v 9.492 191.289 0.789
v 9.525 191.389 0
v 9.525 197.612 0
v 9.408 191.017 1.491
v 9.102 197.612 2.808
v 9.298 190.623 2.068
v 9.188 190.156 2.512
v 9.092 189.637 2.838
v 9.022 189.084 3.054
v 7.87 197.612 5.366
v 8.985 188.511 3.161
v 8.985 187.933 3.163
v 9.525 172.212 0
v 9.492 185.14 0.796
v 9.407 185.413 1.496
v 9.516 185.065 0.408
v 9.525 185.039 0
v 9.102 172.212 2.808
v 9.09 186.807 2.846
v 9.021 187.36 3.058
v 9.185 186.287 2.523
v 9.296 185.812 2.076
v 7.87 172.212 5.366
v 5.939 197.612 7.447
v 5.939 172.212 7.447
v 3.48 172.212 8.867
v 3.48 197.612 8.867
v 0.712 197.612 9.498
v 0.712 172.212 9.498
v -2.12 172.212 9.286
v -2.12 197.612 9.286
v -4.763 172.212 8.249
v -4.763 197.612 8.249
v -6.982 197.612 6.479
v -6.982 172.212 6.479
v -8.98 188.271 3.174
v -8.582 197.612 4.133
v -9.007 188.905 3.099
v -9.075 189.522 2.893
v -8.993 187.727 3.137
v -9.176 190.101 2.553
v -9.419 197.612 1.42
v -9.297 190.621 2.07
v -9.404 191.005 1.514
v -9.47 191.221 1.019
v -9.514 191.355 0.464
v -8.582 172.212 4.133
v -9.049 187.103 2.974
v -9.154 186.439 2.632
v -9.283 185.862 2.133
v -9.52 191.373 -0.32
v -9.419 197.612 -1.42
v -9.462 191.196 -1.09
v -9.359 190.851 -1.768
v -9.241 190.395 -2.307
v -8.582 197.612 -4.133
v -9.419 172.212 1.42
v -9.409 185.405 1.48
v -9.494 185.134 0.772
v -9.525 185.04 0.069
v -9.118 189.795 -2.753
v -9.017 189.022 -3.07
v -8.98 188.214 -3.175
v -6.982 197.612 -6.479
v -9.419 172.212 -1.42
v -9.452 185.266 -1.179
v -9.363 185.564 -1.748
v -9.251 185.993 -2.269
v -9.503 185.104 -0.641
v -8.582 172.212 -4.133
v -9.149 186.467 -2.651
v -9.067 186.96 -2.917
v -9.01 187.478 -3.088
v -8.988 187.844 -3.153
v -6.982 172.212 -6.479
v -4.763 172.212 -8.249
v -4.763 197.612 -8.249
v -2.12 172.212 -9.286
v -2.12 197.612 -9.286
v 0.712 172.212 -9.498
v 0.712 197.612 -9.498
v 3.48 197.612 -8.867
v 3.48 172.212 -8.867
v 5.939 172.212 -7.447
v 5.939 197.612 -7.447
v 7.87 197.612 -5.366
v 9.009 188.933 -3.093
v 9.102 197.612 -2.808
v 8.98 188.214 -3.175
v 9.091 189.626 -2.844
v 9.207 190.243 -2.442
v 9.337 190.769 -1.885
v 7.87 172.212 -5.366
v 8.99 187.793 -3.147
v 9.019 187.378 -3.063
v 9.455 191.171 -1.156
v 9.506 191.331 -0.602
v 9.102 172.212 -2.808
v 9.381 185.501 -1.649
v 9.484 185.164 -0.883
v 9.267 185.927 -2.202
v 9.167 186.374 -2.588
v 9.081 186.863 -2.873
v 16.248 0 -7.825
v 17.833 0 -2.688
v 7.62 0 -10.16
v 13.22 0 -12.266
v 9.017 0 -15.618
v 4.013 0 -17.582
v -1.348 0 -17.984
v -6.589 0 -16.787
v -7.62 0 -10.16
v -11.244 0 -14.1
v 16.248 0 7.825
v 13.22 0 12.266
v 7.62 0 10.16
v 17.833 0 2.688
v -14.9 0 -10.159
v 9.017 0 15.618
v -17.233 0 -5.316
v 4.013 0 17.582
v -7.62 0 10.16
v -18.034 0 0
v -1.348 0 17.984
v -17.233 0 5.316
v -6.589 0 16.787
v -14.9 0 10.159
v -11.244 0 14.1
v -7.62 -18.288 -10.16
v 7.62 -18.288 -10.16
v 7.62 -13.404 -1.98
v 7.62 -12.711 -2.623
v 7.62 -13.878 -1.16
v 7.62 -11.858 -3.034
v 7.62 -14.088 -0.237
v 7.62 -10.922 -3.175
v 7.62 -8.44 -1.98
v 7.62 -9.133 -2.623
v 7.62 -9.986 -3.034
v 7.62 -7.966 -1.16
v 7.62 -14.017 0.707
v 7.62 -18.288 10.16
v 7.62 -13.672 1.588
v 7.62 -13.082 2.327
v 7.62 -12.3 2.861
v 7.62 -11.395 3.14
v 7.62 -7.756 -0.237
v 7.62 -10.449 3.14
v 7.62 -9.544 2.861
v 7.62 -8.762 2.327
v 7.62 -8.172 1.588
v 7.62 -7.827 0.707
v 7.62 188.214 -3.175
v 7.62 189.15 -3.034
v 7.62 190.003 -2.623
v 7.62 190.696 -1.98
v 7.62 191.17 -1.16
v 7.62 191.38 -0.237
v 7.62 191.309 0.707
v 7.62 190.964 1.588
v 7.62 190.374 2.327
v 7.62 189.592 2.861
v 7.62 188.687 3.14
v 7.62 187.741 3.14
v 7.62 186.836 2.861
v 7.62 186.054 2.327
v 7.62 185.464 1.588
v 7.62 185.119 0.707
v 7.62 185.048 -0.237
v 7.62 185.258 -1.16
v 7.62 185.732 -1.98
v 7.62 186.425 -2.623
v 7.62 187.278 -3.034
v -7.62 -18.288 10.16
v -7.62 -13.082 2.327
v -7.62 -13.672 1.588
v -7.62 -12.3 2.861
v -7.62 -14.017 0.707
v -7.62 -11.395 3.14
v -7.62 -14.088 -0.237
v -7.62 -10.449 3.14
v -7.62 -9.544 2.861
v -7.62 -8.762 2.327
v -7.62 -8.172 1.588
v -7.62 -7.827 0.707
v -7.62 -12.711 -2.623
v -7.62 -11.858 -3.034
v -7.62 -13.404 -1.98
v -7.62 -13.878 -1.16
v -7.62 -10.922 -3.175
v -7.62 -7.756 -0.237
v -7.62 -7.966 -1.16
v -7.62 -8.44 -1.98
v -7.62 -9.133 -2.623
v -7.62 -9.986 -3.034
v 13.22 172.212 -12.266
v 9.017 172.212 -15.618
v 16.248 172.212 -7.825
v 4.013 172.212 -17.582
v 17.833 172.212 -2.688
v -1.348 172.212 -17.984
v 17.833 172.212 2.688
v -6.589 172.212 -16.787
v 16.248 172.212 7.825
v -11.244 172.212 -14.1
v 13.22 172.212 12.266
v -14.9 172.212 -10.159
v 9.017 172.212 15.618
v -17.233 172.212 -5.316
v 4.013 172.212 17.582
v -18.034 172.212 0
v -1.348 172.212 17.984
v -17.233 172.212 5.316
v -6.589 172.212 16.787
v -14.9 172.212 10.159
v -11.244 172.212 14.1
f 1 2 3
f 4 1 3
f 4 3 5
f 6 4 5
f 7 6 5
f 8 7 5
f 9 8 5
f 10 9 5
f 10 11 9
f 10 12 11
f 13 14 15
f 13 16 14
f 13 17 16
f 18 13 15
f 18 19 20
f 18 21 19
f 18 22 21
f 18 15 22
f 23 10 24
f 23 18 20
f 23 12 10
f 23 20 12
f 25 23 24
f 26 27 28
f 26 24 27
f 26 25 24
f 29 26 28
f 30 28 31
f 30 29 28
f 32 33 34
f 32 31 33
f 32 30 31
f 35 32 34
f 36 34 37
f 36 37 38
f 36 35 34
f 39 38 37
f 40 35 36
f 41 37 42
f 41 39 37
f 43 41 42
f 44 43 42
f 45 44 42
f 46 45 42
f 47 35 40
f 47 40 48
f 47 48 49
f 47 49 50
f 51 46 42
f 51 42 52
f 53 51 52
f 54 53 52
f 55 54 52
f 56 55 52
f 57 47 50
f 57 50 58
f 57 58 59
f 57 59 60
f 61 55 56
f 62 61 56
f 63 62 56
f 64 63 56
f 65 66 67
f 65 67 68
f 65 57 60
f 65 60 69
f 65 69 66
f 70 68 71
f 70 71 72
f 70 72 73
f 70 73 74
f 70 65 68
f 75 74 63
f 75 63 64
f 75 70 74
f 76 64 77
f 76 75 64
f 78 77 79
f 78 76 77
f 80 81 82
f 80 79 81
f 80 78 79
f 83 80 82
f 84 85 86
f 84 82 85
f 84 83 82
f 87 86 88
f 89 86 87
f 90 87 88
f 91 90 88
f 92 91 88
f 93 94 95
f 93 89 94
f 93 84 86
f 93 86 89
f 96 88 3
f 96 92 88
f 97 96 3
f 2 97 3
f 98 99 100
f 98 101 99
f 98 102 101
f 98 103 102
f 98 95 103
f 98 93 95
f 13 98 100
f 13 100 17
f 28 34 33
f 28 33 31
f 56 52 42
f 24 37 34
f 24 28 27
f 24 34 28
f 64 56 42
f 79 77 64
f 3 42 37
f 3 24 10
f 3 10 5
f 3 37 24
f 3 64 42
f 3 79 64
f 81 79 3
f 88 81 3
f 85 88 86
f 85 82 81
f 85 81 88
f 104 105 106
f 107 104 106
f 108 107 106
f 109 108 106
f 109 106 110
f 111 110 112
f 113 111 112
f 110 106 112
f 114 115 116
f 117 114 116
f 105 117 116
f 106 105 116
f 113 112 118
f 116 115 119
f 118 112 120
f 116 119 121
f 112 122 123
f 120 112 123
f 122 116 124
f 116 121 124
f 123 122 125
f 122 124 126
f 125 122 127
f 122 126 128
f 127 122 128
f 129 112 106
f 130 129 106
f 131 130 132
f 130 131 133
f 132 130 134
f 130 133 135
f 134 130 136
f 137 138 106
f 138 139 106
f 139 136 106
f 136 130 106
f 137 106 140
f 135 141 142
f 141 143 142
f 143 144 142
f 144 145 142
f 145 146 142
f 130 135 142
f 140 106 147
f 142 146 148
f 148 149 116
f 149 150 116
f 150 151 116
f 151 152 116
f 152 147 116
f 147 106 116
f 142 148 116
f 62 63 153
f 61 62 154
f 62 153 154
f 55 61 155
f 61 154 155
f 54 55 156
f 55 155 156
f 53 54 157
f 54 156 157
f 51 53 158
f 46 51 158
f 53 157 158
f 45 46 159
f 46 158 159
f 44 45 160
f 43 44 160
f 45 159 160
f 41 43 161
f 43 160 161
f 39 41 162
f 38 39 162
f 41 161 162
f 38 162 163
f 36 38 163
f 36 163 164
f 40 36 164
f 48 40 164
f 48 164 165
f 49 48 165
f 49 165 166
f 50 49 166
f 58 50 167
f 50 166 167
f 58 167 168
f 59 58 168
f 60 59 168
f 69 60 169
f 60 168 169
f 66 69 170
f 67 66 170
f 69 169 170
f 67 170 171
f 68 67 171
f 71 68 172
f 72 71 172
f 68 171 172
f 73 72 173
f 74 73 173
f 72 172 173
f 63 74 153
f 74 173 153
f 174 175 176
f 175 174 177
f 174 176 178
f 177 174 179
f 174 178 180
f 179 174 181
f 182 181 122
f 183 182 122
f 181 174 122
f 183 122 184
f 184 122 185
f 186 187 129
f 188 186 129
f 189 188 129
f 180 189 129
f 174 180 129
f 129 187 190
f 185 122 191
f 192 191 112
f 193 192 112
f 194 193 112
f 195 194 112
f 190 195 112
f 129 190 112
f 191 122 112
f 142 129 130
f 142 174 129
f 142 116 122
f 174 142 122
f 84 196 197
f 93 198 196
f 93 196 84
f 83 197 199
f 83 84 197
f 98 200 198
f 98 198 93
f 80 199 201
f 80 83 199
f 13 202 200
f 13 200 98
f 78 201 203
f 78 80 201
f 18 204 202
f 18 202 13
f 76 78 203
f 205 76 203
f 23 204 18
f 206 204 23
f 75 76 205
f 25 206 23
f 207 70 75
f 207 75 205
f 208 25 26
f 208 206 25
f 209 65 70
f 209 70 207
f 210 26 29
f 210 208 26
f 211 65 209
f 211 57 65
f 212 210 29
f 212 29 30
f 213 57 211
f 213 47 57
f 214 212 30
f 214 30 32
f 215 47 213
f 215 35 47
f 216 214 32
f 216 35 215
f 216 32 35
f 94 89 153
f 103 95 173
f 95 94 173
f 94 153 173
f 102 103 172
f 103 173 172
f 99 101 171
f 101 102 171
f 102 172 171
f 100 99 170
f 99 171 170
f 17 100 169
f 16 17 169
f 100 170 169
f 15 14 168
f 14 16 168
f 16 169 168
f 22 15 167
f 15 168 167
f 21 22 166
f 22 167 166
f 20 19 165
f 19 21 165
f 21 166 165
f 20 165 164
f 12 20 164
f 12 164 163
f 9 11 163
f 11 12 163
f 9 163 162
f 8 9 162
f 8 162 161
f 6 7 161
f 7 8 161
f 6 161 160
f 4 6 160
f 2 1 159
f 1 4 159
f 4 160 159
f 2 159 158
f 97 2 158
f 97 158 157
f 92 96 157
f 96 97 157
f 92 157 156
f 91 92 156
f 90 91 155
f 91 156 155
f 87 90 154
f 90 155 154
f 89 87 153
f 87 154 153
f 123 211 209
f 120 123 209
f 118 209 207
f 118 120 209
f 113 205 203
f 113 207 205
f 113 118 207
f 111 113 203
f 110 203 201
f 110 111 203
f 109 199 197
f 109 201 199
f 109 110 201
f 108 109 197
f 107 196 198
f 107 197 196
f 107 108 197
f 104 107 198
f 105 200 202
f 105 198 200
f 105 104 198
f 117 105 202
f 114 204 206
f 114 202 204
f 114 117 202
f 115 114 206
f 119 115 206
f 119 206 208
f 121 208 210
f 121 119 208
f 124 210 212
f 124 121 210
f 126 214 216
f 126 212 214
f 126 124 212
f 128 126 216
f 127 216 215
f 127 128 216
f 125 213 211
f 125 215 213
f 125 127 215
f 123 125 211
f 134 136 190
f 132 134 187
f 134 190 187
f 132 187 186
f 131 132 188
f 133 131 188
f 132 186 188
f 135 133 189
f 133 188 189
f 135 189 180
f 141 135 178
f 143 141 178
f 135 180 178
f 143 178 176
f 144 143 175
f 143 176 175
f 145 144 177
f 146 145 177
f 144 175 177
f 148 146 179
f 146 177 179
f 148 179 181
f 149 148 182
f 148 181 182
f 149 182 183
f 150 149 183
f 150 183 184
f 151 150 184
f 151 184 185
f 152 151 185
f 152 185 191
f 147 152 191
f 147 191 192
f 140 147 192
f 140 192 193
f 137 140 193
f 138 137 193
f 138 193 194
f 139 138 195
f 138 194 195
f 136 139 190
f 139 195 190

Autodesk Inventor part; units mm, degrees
ref_plane "YZ Plane" through (0, 0, 0) normal (1, 0, 0) x (0, 1, 0)
ref_plane "XZ Plane" through (0, 0, 0) normal (0, 1, 0) x (-1, 0, 0)
ref_plane "XY Plane" through (0, 0, 0) normal (0, 0, 1) x (1, 0, 0)
sketch "Sketch1" plane through (0, 0, 0) normal (0, 1, 0) x (-1, 0, 0)
  circle A0 centre (0, 0) radius 18.034
  dimension "d0" = 36.068
extrude "Extrusion1" add sketch "Sketch1" along normal blind 172.212
sketch "Sketch2" plane through (0, 172.212, 0) normal (0, 1, 0) x (1, 0, 0)
  circle A0 centre (0, 0) radius 9.525
  dimension "d3" = 19.05
extrude "Extrusion2" add sketch "Sketch2" along normal blind 25.4
sketch "Sketch3" plane through (0, 0, 0) normal (0, -1, 0) x (1, 0, 0)
  line L0 (-7.62, -10.16) -> (7.62, -10.16)
  line L1 (7.62, -10.16) -> (7.62, 10.16)
  line L2 (7.62, 10.16) -> (-7.62, 10.16)
  line L3 (-7.62, 10.16) -> (-7.62, -10.16)
  line L4 (-7.62, -10.16) -> (7.62, 10.16) construction
  line L5 (7.62, -10.16) -> (-7.62, 10.16) construction
  point P0 (0, 0)
  dimension "d6" = 15.24
  dimension "d7" = 20.32
extrude "Extrusion3" add sketch "Sketch3" along normal blind 18.288
sketch "Sketch4" plane through (7.62, 0, 10.16) normal (1, 0, 0) x (0, 0, -1)
  line L0 (0, 0) -> (20.32, 0) projected
  line L1 (20.32, 0) -> (20.32, -18.288) projected
  point P0 (10.16, 0)
  point P1 (10.16, -10.922)
  dimension "d10" = 10.922
  dimension "d11" = 10.16
hole "Hole1" at (7.62, -10.922, 0) direction (-1, 0, 0) diameter 6.35 end through all
sketch "Sketch5" plane through (7.62, 0, 10.16) normal (1, 0, 0) x (0, 0, -1)
  circle A0 centre (10.16, 188.214) radius 3.175
  line L0 (19.685, 197.612) -> (0.635, 197.612) projected
  point P0 (10.16, 0)
  dimension "d19" = 6.35
  dimension "d24" = 9.398
extrude "Extrusion4" cut sketch "Sketch5" along normal mid plane 127
properties part number "7.5 inch Linear Actuator"
